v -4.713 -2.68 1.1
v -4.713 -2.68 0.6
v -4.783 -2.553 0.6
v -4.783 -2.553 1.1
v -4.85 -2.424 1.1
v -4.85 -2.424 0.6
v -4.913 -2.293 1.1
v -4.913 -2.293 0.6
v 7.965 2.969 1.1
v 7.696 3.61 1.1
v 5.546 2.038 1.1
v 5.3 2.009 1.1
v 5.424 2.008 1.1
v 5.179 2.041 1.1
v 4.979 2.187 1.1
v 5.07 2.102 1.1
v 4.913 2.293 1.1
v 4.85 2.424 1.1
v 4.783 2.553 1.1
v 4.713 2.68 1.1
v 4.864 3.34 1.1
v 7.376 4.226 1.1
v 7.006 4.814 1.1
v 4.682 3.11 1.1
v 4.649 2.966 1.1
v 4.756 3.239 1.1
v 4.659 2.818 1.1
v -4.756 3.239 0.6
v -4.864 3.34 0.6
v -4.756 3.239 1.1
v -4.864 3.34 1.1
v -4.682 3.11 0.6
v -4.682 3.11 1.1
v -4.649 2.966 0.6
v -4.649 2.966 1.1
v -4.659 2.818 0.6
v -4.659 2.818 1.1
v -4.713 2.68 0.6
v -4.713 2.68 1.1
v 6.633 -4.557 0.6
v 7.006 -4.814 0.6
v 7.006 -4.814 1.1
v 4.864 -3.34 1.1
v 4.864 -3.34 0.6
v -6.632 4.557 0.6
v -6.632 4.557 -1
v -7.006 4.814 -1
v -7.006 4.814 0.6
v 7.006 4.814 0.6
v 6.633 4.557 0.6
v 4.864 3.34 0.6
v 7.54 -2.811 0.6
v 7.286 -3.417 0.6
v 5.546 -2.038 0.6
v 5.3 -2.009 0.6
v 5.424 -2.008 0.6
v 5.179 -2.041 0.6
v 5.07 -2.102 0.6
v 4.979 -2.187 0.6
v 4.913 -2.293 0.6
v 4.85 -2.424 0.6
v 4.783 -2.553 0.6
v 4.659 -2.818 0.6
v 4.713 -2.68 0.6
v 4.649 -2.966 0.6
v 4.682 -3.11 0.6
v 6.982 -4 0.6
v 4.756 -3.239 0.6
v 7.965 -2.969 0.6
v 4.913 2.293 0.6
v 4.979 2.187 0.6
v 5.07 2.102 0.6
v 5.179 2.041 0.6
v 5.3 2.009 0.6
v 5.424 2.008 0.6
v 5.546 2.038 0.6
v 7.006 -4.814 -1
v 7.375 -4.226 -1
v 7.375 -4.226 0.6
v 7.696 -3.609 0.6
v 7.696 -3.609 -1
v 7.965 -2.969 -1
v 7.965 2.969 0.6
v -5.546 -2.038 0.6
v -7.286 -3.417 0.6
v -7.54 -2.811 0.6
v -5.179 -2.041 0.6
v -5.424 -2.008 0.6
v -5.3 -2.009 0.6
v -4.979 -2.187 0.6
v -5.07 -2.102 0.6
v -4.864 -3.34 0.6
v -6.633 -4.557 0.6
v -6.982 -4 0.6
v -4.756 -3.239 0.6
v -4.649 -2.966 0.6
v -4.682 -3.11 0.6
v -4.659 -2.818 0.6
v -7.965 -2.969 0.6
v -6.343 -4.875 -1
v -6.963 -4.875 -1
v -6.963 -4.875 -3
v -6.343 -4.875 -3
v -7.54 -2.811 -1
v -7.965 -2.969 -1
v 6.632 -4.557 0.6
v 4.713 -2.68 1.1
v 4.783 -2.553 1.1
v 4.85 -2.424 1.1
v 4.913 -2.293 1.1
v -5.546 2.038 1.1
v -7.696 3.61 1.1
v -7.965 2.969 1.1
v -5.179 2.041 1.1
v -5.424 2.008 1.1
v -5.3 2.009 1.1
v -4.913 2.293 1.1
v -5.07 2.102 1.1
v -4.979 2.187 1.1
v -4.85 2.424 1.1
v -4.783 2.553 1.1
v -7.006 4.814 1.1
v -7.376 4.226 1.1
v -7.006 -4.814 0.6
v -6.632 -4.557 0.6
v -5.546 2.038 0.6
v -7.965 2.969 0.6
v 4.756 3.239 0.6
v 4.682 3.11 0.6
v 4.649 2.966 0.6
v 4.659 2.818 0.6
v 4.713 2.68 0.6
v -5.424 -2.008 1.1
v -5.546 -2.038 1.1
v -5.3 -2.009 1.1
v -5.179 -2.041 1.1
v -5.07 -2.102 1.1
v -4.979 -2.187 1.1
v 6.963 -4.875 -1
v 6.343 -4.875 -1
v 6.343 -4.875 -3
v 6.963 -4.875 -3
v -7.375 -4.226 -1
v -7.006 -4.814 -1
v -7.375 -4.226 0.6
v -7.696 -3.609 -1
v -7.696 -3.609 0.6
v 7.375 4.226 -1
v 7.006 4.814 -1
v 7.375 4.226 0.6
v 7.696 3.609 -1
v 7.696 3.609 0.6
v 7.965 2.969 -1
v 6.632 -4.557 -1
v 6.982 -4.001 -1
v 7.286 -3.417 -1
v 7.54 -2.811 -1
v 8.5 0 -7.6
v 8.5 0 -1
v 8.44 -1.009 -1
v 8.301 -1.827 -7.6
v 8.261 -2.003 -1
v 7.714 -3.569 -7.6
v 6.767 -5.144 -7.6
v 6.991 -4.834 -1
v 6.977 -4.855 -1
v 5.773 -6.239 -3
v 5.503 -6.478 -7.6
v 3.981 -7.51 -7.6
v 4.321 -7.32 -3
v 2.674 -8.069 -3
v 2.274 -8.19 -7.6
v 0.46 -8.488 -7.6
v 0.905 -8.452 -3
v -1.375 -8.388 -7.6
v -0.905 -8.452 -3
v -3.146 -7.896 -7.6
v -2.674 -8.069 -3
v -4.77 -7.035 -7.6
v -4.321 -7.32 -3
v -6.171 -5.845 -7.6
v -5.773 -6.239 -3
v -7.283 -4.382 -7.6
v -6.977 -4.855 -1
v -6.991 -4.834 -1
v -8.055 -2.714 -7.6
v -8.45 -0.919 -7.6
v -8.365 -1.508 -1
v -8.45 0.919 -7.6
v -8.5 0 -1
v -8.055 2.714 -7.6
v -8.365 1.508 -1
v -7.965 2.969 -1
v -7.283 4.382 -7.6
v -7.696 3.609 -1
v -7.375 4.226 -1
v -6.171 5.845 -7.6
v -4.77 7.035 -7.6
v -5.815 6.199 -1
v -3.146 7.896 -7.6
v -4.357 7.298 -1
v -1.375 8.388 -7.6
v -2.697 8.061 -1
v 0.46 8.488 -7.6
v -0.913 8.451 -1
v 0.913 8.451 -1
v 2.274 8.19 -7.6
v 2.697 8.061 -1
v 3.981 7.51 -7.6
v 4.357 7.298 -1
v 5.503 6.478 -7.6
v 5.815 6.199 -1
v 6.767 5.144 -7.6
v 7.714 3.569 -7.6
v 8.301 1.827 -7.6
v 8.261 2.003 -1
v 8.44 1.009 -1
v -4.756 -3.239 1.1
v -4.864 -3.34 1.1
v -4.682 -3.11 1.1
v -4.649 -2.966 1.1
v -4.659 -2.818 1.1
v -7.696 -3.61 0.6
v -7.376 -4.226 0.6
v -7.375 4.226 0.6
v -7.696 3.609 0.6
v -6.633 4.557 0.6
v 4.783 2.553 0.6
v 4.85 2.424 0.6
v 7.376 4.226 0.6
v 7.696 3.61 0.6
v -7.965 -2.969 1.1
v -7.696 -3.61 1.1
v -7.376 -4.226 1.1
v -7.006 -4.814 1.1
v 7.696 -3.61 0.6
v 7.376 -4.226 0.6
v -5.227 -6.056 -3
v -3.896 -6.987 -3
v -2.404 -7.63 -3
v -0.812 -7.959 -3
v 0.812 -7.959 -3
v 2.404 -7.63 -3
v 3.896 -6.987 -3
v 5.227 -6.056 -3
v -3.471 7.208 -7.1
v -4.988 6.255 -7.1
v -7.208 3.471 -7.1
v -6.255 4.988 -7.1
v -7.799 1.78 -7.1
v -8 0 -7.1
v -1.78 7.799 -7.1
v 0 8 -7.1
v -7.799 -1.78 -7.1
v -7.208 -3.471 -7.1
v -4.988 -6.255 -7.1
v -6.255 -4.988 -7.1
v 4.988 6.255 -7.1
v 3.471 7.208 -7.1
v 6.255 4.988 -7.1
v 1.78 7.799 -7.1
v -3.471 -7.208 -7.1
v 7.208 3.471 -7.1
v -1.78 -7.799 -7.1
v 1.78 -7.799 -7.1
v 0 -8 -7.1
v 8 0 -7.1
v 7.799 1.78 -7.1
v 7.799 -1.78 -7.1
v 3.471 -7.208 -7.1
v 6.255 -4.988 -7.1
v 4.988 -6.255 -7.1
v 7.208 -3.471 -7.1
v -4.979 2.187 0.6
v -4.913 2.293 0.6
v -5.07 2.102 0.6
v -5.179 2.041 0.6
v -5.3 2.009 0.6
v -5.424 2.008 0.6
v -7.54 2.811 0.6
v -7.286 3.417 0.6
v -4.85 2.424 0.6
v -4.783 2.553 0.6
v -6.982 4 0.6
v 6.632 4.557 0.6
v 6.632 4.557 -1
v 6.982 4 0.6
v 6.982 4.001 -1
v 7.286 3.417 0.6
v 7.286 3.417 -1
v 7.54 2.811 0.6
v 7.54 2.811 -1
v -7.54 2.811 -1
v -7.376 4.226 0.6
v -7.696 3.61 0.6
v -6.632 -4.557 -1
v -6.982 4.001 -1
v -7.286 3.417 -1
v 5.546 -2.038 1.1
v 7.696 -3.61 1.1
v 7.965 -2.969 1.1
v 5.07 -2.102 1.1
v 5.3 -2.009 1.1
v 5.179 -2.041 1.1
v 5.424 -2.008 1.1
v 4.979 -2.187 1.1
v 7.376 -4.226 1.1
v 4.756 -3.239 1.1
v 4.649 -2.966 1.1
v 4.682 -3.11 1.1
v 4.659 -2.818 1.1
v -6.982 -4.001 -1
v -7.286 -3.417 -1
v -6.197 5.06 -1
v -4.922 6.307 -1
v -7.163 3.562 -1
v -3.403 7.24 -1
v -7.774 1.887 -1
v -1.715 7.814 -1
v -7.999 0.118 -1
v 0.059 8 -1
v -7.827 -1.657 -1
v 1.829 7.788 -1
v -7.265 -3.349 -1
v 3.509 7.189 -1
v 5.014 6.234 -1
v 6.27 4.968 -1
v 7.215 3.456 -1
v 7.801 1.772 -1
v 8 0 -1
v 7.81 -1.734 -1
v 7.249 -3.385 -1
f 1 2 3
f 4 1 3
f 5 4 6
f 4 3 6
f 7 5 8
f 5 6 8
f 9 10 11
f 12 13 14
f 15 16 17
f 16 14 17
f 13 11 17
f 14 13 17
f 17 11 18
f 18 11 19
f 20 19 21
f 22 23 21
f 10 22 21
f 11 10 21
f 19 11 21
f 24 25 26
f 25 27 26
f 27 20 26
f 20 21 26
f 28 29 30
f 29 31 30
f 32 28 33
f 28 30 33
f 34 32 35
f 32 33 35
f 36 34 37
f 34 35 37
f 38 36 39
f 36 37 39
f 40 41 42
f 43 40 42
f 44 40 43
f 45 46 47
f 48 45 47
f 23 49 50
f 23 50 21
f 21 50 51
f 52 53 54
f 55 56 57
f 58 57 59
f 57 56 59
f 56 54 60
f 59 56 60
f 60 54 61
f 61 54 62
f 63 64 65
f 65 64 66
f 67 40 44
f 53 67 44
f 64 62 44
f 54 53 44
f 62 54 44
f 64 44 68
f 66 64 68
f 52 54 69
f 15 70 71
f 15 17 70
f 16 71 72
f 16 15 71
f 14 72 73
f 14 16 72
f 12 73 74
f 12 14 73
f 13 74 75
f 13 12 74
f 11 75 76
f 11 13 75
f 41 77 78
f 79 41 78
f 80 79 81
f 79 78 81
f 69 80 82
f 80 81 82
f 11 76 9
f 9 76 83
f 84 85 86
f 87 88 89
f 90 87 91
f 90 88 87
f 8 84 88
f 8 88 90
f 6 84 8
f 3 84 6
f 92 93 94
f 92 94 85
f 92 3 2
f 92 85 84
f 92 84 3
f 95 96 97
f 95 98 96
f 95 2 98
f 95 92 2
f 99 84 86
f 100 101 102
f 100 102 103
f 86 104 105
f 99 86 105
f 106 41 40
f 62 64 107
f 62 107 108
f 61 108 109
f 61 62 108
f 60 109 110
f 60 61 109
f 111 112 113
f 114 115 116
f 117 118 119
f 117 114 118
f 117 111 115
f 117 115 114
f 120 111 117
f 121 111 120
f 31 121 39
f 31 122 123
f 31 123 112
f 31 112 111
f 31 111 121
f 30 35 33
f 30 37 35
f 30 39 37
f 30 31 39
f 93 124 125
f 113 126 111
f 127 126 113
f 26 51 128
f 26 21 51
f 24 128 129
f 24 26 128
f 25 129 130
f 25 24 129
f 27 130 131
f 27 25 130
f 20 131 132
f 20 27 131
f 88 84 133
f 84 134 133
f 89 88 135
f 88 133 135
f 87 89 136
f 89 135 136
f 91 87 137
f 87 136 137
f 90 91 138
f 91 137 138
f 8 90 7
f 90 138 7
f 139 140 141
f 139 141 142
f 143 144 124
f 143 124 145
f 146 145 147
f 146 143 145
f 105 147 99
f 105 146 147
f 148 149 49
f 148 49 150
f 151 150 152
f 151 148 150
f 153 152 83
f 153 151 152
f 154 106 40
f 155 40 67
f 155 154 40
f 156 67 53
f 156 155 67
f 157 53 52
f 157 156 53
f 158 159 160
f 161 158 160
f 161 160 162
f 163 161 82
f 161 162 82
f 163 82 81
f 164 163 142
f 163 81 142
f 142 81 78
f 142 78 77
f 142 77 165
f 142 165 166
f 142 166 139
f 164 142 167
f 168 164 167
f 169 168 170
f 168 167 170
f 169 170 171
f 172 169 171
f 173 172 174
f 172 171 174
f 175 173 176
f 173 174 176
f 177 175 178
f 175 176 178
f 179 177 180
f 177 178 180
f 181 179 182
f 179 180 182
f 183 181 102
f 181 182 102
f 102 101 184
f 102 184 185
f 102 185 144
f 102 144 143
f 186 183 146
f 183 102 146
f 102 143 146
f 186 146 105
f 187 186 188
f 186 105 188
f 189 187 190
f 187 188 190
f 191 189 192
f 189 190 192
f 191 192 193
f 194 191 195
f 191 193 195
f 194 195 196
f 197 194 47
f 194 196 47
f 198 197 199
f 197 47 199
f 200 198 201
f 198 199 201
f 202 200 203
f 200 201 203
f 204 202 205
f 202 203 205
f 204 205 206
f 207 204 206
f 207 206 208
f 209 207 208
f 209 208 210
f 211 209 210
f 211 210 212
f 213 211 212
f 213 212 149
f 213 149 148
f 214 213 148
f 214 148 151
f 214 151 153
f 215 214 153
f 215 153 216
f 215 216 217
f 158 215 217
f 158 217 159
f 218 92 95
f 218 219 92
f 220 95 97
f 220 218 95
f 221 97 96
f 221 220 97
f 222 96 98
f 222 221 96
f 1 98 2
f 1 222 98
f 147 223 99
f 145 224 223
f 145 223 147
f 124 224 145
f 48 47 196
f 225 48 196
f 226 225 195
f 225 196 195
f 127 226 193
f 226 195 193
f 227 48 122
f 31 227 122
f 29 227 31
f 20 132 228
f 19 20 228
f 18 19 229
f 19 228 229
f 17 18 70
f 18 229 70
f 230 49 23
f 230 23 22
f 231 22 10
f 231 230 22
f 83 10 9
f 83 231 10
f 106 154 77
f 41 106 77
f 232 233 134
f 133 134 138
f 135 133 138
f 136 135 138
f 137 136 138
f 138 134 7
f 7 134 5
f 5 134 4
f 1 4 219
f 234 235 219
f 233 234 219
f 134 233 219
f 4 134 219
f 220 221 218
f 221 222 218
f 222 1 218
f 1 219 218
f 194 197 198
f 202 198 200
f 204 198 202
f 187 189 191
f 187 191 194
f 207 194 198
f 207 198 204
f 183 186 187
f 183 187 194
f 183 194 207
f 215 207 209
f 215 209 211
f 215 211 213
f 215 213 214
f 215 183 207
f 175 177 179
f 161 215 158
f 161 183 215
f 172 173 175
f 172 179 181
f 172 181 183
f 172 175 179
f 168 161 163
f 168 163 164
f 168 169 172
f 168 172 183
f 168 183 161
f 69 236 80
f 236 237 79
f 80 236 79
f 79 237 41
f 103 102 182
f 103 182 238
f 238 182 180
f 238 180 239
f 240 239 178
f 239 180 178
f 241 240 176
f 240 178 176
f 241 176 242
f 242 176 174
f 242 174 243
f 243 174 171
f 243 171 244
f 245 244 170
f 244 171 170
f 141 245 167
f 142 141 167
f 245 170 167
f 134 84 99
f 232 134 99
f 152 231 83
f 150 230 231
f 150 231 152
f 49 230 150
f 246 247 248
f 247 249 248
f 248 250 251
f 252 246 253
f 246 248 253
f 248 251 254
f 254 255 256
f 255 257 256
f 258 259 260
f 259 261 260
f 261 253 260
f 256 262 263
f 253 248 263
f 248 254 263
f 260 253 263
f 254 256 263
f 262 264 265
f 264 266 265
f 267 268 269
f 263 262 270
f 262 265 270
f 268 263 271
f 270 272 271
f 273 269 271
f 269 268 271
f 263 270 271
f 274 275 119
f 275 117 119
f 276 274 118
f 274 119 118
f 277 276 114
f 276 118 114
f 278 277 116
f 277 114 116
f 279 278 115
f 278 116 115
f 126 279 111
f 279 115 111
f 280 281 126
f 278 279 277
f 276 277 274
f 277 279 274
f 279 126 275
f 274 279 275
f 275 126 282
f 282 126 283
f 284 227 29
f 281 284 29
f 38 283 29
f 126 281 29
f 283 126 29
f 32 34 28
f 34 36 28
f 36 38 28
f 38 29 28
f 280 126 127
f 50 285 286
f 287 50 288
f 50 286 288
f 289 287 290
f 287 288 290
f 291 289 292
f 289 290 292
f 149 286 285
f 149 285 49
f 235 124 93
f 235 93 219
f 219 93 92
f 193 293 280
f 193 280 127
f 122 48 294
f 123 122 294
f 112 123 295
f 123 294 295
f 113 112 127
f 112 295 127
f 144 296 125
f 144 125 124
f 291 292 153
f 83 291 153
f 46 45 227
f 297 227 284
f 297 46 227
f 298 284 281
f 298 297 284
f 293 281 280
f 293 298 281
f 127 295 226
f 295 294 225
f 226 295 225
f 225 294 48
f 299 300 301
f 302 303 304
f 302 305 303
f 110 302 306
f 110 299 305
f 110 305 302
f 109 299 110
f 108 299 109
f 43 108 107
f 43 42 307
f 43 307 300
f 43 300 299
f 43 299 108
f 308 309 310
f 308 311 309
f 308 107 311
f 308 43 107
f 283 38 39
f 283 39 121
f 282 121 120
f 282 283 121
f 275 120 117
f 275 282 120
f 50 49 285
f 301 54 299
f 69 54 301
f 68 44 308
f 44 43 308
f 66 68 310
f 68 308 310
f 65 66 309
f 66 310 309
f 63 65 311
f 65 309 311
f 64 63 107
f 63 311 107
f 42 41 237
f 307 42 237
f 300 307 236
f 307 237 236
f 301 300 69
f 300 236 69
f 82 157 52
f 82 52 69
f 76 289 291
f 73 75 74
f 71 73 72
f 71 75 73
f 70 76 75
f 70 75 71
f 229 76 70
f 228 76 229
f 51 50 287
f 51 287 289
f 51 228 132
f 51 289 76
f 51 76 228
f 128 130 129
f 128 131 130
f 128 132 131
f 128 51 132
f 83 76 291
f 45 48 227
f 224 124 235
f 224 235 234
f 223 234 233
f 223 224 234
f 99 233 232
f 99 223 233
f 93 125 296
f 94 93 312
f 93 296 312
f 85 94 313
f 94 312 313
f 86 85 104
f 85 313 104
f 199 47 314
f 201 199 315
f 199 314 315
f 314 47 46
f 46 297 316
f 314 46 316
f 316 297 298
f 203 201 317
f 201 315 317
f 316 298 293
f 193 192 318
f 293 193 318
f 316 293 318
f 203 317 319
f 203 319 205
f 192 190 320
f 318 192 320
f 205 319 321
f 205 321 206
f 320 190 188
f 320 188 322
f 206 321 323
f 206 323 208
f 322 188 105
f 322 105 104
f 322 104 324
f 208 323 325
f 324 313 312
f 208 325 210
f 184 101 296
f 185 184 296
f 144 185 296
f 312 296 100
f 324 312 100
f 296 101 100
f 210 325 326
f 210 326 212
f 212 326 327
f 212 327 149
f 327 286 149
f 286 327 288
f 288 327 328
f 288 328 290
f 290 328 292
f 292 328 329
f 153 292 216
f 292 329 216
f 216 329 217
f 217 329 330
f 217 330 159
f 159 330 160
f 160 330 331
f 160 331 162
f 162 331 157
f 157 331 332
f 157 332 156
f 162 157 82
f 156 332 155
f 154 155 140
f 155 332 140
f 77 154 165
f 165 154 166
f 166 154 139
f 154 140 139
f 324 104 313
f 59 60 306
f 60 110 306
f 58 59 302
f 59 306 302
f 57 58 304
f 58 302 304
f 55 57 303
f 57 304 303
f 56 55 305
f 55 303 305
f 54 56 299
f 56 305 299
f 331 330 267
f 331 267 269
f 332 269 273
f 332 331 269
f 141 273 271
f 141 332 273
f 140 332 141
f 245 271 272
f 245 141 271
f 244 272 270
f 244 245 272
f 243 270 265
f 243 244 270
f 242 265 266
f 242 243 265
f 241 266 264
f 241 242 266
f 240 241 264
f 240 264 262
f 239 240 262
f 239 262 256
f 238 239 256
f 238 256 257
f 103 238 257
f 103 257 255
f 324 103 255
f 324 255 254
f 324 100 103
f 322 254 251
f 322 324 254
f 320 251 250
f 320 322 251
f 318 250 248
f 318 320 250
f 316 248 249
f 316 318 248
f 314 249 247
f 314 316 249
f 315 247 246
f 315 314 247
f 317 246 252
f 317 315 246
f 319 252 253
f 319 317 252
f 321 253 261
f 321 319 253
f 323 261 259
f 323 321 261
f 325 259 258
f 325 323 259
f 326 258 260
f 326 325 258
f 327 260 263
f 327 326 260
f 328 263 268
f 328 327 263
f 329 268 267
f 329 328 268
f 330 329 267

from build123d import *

# Parameters (mm, degrees)
SKETCH007_R                    = 8.5
PAD006_DEPTH                   = 6.6
THICKNESS_T                    = -0.5
PAD007_DEPTH                   = 1.6
PAD007_POLARPATTERN_2_DEPTH    = 1.6
PAD008_DEPTH                   = 0.5
PAD008_POLARPATTERN001_2_DEPTH = 0.5
SKETCH011_W                    = 13.925584
SKETCH011_H                    = 6.6246
POCKET001_DEPTH                = 2
FILLET006_R                    = 0.5


with BuildPart() as part:
    # Sketch007 (on DatumPlane) → Pad006 (new body)
    with BuildSketch(Plane(origin=(0, 0, -1), x_dir=(1, 0, 0), z_dir=(0, 0, -1))):
        Circle(SKETCH007_R)
    extrude(amount=PAD006_DEPTH)

    # Thickness
    thickness_openings = [part.faces().sort_by_distance(p)[0] for p in [
        (0, 0, -1),
    ]]
    offset(amount=THICKNESS_T, openings=thickness_openings)

    # Sketch008 (on Face3 of Thickness) → Pad007 (join)
    with BuildSketch(Plane.XY.offset(-1)):
        with BuildLine():
            ThreePointArc((-7.005526, 4.813794), (-7.541696, 3.920819), (-7.964623, 2.96897))
            Line((-7.540357, 2.810816), (-7.964623, 2.96897))
            ThreePointArc((-6.632349, 4.557368), (-7.139959, 3.711961), (-7.540357, 2.810816))
            Line((-6.632349, 4.557368), (-7.005526, 4.813794))
        make_face()
    pad007 = extrude(amount=PAD007_DEPTH)

    # Sketch008 PolarPattern 2 → Pad007 PolarPattern 2 (add)
    with BuildSketch(Plane(origin=(0, 0, -1), x_dir=(-1, 0, 0), z_dir=(0, 0, 1))):
        with BuildLine():
            ThreePointArc((-7.005526, 4.813794), (-7.541696, 3.920819), (-7.964623, 2.96897))
            Line((-7.540357, 2.810816), (-7.964623, 2.96897))
            ThreePointArc((-6.632349, 4.557368), (-7.139959, 3.711961), (-7.540357, 2.810816))
            Line((-6.632349, 4.557368), (-7.005526, 4.813794))
        make_face()
    pad007_polarpattern_2 = extrude(amount=PAD007_POLARPATTERN_2_DEPTH)

    # Mirrored: Pad007, Pad007 PolarPattern 2 across Sketch008 V_Axis
    add(pad007.mirror(Plane(origin=(0, 0, -1), x_dir=(0, 0, 1), z_dir=(1, 0, 0))))
    add(pad007_polarpattern_2.mirror(Plane(origin=(0, 0, -1), x_dir=(0, 0, 1), z_dir=(1, 0, 0))))

    # Sketch009 (on Face23 of MultiTransform) → Pad008 (join)
    with BuildSketch(Plane.XY.offset(0.6)):
        with BuildLine():
            ThreePointArc((-7.005526, 4.813794), (-7.542066, 3.921011), (-7.964623, 2.96897))
            Line((-5.09111, 1.862853), (-7.964623, 2.96897))
            ThreePointArc((-4.469489, 3.068188), (-4.818529, 2.485236), (-5.09111, 1.862853))
            Line((-7.005526, 4.813794), (-4.469489, 3.068188))
        make_face()
    pad008 = extrude(amount=PAD008_DEPTH)

    # Sketch009 PolarPattern001 2 → Pad008 PolarPattern001 2 (add)
    with BuildSketch(Plane(origin=(0, 0, 0.6), x_dir=(-1, 0, 0), z_dir=(0, 0, 1))):
        with BuildLine():
            ThreePointArc((-7.005526, 4.813794), (-7.542066, 3.921011), (-7.964623, 2.96897))
            Line((-5.09111, 1.862853), (-7.964623, 2.96897))
            ThreePointArc((-4.469489, 3.068188), (-4.818529, 2.485236), (-5.09111, 1.862853))
            Line((-7.005526, 4.813794), (-4.469489, 3.068188))
        make_face()
    pad008_polarpattern001_2 = extrude(amount=PAD008_POLARPATTERN001_2_DEPTH)

    # Mirrored001: Pad008, Pad008 PolarPattern001 2 across Sketch009 V_Axis
    add(pad008.mirror(Plane(origin=(0, 0, 0.6), x_dir=(0, 0, 1), z_dir=(1, 0, 0))))
    add(pad008_polarpattern001_2.mirror(Plane(origin=(0, 0, 0.6), x_dir=(0, 0, 1), z_dir=(1, 0, 0))))

    # Sketch011 (on Face1 of ShapeBinder001) → Pocket001 (cut)
    with BuildSketch(Plane(origin=(0, 0, -1), x_dir=(1, 0, 0), z_dir=(0, 0, -1))):
        with Locations((0, 8.1877)):
            Rectangle(SKETCH011_W, SKETCH011_H)
    extrude(amount=POCKET001_DEPTH, mode=Mode.SUBTRACT)

    # Fillet006
    fillet006_edges = [part.edges().sort_by_distance(p)[0] for p in [
        (-5.09111, -1.862853, 0.85),
        (-4.469489, -3.068188, 0.85),
        (4.469489, -3.068188, 0.85),
        (5.09111, -1.862853, 0.85),
        (5.09111, 1.862853, 0.85),
        (4.469489, 3.068188, 0.85),
        (-5.09111, 1.862853, 0.85),
        (-4.469489, 3.068188, 0.85),
    ]]
    fillet(fillet006_edges, radius=FILLET006_R)


solid = part.part
